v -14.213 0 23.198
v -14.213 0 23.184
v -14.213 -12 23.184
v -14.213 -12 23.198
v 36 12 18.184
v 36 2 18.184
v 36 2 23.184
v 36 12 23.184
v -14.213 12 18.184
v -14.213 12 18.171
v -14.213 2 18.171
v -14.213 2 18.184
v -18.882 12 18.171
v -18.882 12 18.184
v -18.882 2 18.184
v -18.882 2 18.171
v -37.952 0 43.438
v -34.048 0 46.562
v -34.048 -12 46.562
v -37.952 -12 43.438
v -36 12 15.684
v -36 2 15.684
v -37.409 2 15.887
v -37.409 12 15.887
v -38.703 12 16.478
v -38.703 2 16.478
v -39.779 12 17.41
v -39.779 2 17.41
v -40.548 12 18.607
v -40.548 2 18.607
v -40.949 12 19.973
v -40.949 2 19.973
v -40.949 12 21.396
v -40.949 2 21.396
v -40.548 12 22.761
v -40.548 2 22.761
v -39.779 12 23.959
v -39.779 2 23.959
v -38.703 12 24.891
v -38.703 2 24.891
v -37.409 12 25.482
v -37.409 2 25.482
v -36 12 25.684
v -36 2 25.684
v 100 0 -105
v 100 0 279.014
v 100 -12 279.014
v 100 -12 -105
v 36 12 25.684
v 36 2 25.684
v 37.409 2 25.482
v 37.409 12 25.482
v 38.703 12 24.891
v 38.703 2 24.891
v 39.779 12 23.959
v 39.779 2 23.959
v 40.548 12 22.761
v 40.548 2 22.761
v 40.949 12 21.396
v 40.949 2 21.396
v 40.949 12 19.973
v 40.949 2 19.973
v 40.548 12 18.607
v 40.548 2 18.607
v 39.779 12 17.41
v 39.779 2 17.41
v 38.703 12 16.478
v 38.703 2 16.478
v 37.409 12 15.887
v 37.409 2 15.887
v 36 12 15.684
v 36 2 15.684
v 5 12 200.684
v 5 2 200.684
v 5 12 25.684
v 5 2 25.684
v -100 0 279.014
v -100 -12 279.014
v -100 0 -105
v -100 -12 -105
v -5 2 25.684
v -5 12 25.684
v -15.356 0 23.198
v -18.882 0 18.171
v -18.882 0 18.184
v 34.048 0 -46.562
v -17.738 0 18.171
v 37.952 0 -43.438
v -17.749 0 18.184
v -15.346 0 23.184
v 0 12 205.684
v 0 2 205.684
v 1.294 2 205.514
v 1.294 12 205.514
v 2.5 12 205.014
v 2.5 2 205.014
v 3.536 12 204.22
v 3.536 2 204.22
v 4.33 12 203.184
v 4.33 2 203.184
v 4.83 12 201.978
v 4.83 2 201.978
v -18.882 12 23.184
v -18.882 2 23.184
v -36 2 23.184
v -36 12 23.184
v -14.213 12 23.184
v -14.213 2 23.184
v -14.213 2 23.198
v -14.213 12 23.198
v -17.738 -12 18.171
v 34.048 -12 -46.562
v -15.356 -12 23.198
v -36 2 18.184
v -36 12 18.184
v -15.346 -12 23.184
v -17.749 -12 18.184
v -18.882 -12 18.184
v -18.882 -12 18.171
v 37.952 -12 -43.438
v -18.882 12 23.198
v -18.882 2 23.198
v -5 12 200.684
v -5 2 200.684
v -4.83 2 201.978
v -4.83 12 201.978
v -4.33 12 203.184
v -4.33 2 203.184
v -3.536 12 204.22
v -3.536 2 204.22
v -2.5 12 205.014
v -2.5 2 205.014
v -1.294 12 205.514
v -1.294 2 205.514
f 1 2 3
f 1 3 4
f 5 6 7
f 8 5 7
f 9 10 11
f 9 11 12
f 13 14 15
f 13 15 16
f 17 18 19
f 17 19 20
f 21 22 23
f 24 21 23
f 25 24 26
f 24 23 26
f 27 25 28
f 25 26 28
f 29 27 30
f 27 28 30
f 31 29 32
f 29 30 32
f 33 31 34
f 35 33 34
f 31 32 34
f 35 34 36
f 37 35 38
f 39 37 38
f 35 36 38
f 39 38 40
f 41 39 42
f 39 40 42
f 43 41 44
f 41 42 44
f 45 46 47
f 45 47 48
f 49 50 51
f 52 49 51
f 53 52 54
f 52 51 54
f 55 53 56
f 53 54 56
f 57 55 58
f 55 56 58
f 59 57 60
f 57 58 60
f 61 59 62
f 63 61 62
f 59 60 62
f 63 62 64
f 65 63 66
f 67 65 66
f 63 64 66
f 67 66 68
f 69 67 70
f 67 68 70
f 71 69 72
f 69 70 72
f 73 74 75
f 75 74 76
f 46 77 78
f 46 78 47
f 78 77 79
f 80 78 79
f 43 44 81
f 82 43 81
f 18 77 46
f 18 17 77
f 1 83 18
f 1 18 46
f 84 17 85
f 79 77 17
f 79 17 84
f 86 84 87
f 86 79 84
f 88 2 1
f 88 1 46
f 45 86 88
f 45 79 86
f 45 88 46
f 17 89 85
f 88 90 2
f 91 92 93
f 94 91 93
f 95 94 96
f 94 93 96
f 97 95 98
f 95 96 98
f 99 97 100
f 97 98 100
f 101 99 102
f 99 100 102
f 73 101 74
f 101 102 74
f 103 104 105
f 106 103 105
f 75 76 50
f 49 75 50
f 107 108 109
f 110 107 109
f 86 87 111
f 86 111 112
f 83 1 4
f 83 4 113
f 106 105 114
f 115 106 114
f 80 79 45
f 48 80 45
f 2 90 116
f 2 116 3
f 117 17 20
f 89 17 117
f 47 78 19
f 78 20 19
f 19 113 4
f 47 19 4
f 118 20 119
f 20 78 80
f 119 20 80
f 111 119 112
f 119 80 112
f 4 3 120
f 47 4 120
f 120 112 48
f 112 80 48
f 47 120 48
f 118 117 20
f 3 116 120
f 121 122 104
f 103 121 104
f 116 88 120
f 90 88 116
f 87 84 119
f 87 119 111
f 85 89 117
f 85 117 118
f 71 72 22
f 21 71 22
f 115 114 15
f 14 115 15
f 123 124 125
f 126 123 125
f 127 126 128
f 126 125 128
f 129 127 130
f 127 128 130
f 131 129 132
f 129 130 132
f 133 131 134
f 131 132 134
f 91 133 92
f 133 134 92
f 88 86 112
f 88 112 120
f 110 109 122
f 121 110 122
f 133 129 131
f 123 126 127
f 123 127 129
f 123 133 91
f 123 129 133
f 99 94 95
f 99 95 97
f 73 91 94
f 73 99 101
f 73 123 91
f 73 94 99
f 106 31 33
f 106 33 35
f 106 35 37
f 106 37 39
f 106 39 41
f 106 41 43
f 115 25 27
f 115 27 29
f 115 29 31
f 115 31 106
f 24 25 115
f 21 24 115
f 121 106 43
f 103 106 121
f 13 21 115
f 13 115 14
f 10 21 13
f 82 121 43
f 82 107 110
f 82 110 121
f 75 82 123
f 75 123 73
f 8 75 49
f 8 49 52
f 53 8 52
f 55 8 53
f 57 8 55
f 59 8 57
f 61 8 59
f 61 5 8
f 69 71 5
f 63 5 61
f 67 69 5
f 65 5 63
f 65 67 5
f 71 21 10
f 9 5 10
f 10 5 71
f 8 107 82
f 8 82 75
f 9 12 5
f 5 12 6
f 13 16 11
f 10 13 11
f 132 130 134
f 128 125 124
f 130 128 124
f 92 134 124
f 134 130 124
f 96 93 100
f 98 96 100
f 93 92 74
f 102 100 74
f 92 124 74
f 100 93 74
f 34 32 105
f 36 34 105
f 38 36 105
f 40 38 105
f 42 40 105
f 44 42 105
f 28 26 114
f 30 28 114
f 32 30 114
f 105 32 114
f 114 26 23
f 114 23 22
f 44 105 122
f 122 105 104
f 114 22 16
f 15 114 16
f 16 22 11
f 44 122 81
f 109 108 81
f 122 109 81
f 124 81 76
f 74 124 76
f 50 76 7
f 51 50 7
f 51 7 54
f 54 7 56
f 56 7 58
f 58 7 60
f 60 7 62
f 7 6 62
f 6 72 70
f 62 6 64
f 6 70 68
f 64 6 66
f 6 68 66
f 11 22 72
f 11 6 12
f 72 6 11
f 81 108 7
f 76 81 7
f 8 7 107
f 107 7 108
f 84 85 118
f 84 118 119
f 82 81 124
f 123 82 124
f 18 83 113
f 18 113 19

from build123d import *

# Parameters (mm, degrees)
SKETCH1_W           = 200
SKETCH1_H           = 384.014252746
BOSS_EXTRUDE2_DEPTH = 12
BOSS_EXTRUDE4_START = 2
BOSS_EXTRUDE4_DEPTH = 10


with BuildPart() as part:
    # Sketch1 → Boss-Extrude2 (new body)
    with BuildSketch(Plane(origin=(0, 0, 0), x_dir=(1, 0, 0), z_dir=(0, 1, 0))):
        with Locations((0, -87.007126373)):
            Rectangle(SKETCH1_W, SKETCH1_H)
        Polygon((-34.047827976, -46.561737619), (-37.952172024, -43.438262381), (-17.749031902, -18.184337229), (-18.882263977, -18.184337229), (-18.882263977, -18.171171442), (-17.738499272, -18.171171442), (34.047827976, 46.561737619), (37.952172024, 43.438262381), (-15.345907664, -23.184337229), (-14.212675588, -23.184337229), (-14.212675588, -23.197503015), (-15.356440294, -23.197503015), align=None, mode=Mode.SUBTRACT)
    extrude(amount=-BOSS_EXTRUDE2_DEPTH)


with BuildPart() as body_2:
    # Sketch1<5> → Boss-Extrude4 (new body)
    with BuildSketch(Plane(origin=(0, 0, 0), x_dir=(1, 0, 0), z_dir=(0, 1, 0)).offset(BOSS_EXTRUDE4_START)):
        with BuildLine():
            ThreePointArc((-5, -200.684337229), (0, -205.684337229), (5, -200.684337229))
            Line((5, -200.684337229), (5, -25.684337229))
            Line((5, -25.684337229), (36, -25.684337229))
            ThreePointArc((36, -25.684337229), (41, -20.684337229), (36, -15.684337229))
            Line((36, -15.684337229), (-36, -15.684337229))
            ThreePointArc((-36, -15.684337229), (-41, -20.684337229), (-36, -25.684337229))
            Line((-36, -25.684337229), (-5, -25.684337229))
            Line((-5, -25.684337229), (-5, -200.684337229))
        make_face()
        Polygon((-14.212675588, -23.184337229), (-14.212675588, -23.197503015), (-18.882263977, -23.197503015), (-18.882263977, -23.184337229), (-36, -23.184337229), (-36, -18.184337229), (-18.882263977, -18.184337229), (-18.882263977, -18.171171442), (-14.212675588, -18.171171442), (-14.212675588, -18.184337229), (36, -18.184337229), (36, -23.184337229), align=None, mode=Mode.SUBTRACT)
    extrude(amount=BOSS_EXTRUDE4_DEPTH)


solid = Compound([part.part, body_2.part])
